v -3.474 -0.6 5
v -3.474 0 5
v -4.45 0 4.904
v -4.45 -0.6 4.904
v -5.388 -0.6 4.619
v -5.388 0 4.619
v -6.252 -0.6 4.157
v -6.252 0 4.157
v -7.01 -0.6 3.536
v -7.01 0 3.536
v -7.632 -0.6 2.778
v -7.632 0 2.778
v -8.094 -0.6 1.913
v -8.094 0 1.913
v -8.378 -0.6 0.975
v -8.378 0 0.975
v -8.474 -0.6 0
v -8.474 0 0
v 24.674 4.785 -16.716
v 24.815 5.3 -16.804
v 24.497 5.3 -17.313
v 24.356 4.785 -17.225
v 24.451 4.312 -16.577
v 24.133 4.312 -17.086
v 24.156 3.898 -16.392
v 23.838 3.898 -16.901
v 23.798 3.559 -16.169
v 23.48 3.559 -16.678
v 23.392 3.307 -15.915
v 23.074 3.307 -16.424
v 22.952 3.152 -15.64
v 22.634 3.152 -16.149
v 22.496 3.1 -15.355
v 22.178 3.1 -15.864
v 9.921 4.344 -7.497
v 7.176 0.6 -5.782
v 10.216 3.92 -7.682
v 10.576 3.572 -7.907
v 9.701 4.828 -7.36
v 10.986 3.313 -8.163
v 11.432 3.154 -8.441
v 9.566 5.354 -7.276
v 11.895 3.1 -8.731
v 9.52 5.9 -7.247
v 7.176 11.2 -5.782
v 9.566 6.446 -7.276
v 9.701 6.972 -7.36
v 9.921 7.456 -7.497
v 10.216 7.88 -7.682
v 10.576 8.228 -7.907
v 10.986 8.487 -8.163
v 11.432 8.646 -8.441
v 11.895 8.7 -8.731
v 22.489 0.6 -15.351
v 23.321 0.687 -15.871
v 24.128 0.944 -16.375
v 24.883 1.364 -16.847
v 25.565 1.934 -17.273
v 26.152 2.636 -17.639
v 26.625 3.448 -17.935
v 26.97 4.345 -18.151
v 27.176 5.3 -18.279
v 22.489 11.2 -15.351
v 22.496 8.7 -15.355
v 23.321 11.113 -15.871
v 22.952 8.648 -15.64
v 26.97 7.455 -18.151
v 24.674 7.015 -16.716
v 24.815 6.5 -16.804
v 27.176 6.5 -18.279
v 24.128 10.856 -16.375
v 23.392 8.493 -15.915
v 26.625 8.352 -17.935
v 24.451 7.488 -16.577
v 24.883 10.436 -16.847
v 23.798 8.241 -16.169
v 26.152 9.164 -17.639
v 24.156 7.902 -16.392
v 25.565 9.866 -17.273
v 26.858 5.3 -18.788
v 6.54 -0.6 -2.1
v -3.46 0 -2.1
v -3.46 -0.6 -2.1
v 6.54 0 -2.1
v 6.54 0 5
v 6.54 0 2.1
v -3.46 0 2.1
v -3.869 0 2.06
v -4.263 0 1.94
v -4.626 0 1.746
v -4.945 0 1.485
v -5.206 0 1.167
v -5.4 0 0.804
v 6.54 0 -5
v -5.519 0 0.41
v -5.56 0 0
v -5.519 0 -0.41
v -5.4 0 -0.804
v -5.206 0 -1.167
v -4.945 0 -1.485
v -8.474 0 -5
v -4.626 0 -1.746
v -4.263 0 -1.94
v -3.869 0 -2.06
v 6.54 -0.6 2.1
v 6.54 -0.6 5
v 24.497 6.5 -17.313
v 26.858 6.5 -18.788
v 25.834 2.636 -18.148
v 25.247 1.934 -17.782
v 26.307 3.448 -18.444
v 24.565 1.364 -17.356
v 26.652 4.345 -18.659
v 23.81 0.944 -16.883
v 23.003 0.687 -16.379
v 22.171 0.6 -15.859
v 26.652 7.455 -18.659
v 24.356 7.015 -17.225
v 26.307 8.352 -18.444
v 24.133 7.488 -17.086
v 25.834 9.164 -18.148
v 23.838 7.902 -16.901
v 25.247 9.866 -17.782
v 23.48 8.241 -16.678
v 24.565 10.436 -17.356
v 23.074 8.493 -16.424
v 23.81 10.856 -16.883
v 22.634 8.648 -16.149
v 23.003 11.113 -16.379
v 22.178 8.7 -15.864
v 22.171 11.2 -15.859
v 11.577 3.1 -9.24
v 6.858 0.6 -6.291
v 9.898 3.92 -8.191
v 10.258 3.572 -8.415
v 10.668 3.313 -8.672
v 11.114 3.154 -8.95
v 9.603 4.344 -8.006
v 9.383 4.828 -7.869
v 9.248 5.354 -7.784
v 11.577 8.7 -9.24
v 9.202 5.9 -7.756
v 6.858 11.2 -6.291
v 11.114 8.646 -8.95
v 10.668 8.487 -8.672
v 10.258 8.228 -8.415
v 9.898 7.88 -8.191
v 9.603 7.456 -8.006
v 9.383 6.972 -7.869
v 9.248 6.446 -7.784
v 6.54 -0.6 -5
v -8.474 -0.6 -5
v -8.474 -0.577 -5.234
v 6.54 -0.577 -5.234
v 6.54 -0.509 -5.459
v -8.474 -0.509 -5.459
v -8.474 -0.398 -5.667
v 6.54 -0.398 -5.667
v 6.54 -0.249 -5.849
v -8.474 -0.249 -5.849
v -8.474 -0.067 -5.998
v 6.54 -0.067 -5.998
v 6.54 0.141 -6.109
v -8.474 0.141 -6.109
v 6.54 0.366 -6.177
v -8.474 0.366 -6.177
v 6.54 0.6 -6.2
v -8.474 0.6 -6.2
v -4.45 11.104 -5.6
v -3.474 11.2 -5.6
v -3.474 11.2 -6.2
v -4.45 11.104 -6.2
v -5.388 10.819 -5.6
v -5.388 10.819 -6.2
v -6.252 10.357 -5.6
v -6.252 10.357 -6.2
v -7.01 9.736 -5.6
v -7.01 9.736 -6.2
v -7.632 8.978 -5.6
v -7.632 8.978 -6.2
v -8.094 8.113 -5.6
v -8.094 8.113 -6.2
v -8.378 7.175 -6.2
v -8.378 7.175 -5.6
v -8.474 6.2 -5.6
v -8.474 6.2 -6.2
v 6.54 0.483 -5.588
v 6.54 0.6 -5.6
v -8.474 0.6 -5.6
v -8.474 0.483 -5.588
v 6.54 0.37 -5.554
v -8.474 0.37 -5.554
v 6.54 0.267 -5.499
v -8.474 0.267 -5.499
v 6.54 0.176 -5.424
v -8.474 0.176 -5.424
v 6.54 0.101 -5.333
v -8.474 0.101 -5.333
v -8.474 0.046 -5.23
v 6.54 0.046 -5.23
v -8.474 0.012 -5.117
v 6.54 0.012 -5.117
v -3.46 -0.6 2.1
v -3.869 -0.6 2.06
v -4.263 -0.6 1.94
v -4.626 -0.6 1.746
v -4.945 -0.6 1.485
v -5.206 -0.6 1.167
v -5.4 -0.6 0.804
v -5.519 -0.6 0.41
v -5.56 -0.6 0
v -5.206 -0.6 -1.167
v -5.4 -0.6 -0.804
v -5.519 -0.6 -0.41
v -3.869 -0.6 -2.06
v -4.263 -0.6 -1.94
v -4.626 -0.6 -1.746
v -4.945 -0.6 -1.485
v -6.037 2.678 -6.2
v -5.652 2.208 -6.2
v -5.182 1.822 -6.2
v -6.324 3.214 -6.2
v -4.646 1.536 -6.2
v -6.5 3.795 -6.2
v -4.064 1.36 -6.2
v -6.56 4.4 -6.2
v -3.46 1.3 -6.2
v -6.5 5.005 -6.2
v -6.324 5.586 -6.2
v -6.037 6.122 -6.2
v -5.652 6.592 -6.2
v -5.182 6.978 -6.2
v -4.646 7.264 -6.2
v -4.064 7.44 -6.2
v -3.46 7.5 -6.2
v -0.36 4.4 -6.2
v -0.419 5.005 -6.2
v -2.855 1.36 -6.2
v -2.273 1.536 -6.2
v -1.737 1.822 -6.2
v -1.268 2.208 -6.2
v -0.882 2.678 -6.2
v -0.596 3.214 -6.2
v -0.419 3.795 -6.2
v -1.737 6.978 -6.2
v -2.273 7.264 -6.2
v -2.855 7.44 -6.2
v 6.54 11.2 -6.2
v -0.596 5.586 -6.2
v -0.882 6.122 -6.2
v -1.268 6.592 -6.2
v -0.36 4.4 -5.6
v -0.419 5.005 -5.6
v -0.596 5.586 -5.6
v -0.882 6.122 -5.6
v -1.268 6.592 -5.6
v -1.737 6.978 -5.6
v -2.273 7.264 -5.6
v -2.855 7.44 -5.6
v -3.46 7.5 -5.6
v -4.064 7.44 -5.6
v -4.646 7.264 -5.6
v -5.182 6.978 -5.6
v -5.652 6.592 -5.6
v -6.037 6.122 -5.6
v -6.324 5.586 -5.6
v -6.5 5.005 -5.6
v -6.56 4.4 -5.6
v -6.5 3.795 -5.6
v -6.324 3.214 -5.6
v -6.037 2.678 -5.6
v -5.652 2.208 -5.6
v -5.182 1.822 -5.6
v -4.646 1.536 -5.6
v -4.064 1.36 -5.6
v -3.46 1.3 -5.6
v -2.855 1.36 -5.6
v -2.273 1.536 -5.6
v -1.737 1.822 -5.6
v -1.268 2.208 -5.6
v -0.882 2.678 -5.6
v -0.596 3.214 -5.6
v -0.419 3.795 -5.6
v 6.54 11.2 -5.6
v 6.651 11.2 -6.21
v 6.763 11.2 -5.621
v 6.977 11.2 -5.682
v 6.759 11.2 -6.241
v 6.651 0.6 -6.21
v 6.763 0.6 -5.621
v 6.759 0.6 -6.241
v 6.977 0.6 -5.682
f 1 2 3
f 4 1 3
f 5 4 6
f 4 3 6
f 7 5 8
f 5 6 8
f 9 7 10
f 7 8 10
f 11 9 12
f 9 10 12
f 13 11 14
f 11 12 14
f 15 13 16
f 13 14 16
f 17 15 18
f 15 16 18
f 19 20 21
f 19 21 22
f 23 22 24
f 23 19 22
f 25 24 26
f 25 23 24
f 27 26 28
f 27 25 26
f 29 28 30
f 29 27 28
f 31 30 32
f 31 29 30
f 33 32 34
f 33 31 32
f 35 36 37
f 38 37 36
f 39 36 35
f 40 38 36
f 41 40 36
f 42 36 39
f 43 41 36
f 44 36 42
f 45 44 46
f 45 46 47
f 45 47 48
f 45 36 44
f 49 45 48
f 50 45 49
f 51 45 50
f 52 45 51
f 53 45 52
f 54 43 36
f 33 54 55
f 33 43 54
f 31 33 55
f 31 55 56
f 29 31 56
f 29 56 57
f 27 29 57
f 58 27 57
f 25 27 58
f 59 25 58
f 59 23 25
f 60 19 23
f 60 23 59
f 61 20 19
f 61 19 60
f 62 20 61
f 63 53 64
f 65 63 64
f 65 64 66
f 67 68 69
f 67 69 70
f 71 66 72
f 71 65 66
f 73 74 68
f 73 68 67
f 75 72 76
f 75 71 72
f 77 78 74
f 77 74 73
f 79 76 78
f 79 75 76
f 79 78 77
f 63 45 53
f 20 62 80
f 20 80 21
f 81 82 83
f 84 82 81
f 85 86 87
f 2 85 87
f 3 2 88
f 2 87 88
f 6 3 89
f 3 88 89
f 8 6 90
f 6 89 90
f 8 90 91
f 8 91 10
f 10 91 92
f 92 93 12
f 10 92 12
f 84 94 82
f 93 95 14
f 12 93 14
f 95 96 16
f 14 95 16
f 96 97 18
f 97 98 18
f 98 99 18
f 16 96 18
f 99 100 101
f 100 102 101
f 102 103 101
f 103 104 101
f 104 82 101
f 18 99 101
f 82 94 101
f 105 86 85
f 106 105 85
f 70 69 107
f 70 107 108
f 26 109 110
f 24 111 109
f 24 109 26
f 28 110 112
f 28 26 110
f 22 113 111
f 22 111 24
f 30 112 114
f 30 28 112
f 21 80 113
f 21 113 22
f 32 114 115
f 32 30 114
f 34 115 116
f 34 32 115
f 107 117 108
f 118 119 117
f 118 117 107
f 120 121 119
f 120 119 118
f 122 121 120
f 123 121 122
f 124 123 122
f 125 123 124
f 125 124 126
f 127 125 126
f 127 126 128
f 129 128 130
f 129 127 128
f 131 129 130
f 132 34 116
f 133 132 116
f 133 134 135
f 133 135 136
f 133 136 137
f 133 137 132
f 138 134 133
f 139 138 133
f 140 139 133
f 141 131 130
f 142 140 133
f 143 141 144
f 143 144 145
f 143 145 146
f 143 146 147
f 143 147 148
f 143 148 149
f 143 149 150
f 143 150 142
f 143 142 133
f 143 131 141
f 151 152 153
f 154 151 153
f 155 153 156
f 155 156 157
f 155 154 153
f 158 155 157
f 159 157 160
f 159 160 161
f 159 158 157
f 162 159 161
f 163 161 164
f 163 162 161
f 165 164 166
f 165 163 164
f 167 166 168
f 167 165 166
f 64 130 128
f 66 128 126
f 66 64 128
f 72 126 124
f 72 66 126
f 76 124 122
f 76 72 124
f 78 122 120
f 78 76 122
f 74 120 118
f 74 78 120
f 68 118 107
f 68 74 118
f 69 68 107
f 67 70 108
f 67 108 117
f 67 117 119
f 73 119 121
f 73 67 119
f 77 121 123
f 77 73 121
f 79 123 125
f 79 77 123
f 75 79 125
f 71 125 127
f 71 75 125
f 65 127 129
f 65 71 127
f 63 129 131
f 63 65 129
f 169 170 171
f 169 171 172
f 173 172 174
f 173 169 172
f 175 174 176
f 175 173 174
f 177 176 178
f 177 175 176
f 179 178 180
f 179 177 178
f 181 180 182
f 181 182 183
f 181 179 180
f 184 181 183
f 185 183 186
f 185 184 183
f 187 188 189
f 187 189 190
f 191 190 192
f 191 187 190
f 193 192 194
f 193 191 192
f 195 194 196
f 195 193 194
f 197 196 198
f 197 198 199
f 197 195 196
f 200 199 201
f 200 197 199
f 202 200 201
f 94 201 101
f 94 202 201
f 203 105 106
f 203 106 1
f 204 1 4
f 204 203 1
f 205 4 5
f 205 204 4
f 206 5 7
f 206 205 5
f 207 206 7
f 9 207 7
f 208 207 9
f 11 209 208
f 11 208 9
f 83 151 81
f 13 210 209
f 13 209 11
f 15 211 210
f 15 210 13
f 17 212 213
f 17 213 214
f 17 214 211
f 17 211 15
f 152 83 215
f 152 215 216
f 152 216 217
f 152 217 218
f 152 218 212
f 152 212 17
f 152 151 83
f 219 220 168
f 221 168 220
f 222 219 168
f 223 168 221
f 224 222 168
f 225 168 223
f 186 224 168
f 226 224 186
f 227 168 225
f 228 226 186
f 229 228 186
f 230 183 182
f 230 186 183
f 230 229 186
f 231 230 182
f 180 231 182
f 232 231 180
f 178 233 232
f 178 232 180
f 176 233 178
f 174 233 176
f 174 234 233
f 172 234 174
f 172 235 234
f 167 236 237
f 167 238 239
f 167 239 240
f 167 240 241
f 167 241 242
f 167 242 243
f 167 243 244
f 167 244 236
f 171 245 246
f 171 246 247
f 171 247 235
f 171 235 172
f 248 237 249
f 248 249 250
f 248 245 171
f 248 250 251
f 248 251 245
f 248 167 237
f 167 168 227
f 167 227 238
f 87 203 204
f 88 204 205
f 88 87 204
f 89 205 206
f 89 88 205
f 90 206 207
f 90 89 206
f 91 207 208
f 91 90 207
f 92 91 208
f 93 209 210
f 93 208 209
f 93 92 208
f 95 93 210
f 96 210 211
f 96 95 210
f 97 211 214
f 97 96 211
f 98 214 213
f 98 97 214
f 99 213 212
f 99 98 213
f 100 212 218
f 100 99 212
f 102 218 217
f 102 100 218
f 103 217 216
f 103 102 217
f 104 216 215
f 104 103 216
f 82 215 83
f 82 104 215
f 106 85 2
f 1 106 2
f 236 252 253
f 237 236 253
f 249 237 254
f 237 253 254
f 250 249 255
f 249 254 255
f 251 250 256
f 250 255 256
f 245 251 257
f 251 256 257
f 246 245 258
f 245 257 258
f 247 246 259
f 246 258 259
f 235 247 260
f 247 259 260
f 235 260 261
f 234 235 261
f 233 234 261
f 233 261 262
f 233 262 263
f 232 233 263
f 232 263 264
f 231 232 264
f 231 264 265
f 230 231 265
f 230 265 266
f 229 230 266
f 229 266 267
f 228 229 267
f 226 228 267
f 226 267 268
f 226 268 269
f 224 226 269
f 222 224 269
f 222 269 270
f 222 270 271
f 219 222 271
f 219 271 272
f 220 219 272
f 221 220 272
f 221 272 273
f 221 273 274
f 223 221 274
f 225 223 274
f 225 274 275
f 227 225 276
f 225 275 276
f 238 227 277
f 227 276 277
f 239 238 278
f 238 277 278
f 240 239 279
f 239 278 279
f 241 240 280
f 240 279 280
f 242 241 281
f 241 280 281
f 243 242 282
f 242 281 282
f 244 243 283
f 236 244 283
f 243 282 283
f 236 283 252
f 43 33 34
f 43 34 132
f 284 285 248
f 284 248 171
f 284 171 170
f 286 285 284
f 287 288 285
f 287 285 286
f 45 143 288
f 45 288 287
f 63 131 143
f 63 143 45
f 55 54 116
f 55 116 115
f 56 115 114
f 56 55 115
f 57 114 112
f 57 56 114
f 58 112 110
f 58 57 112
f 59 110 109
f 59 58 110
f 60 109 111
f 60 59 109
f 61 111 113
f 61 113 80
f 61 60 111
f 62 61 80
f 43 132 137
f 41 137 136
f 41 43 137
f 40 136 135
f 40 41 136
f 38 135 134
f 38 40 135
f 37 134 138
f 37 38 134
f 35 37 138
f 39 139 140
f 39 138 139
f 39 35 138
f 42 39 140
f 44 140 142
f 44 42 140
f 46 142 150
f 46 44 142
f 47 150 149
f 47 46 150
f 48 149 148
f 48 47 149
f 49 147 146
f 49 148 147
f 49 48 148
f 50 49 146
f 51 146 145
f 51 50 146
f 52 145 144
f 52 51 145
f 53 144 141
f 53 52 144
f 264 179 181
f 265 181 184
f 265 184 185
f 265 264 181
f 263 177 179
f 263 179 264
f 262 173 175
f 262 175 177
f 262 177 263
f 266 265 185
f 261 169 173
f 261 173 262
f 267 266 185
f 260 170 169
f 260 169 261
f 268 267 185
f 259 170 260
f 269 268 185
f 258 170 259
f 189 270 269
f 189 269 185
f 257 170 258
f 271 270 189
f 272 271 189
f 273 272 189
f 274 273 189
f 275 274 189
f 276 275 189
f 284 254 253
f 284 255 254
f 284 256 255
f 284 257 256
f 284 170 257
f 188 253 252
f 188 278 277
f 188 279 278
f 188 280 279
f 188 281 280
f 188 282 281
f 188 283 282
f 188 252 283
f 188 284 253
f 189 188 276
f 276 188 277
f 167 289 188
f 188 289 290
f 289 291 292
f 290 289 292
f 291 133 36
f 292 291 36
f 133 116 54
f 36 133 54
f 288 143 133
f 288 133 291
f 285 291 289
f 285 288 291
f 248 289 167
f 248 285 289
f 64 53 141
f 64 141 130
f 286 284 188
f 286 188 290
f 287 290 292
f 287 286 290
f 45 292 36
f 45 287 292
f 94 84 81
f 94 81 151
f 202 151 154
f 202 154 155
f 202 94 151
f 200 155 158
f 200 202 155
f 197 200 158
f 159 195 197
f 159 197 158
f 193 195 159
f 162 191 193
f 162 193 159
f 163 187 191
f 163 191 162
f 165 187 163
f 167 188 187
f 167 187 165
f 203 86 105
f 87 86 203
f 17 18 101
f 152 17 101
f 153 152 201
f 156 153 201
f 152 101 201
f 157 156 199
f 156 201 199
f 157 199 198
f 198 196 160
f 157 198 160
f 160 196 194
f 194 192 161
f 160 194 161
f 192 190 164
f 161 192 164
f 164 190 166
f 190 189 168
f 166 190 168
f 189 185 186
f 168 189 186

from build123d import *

# Parameters (mm, degrees)
BASE_FLANGE1_DEPTH = 0.6
CUT_EXTRUDE1_DEPTH = 10
EDGE_FLANGE1_DEPTH = 15.014611851
CUT_EXTRUDE2_DEPTH = 10
SKETCH11_R         = 3.1
CUT_EXTRUDE3_DEPTH = 10
EDGE_FLANGE2_DEPTH = 10.6
CUT_EXTRUDE4_DEPTH = 10
CUT_EXTRUDE5_DEPTH = 10


# Sheet-metal steps are written as plain solids
with BuildPart() as part:
    # Sketch1 → Base-Flange1 (new body)
    with BuildSketch(Plane(origin=(0, 0, 0), x_dir=(1, 0, 0), z_dir=(0, 1, 0))):
        with BuildLine():
            Line((-8.474188988, 5), (6.540422863, 5))
            Line((6.540422863, 5), (6.540422863, -5))
            Line((6.540422863, -5), (-3.474188988, -5))
            ThreePointArc((-3.474188988, -5), (-7.009722894, -3.535533906), (-8.474188988, 0))
            Line((-8.474188988, 0), (-8.474188988, 5))
        make_face()
    extrude(amount=-BASE_FLANGE1_DEPTH)

    # Sketch6 → Cut-Extrude1 (cut)
    with BuildSketch(Plane(origin=(0, 0, 0), x_dir=(1, 0, 0), z_dir=(0, 1, 0))):
        with BuildLine():
            Line((6.540422863, -2.1), (-3.459577137, -2.1))
            ThreePointArc((-3.459577137, -2.1), (-5.559577137, 0), (-3.459577137, 2.1))
            Line((-3.459577137, 2.1), (6.540422863, 2.1))
            Line((6.540422863, 2.1), (6.540422863, -2.1))
        make_face()
    extrude(amount=-CUT_EXTRUDE1_DEPTH, mode=Mode.SUBTRACT)

    # Edge-Flange1 section (across the edge) → Edge-Flange1 (add)
    with BuildSketch(Plane(origin=(6.540422863, 0, -5.6), x_dir=(0, 0, 1), z_dir=(-1, 0, 0))):
        with BuildLine():
            Line((-0.6, 0.6), (-0.6, 11.2))
            Line((-0.6, 11.2), (0, 11.2))
            Line((0, 11.2), (0, 0.6))
            ThreePointArc((0, 0.6), (0.175735931, 0.175735931), (0.6, 0))
            Line((0.6, 0), (0.6, -0.6))
            ThreePointArc((0.6, -0.6), (-0.248528137, -0.248528137), (-0.6, 0.6))
        make_face()
    extrude(amount=EDGE_FLANGE1_DEPTH)

    # Sketch10 → Cut-Extrude2 (cut)
    with BuildSketch(Plane.XY.offset(-5.6)):
        with BuildLine():
            Line((-8.474188988, 6.2), (-8.474188988, 11.2))
            Line((-8.474188988, 11.2), (-3.474188988, 11.2))
            ThreePointArc((-3.474188988, 11.2), (-7.009722894, 9.735533906), (-8.474188988, 6.2))
        make_face()
    extrude(amount=-CUT_EXTRUDE2_DEPTH, mode=Mode.SUBTRACT)

    # Sketch11 → Cut-Extrude3 (cut)
    with BuildSketch(Plane.XY.offset(-5.6)):
        with Locations((-3.459577137, 4.4)):
            Circle(SKETCH11_R)
    extrude(amount=-CUT_EXTRUDE3_DEPTH, mode=Mode.SUBTRACT)

    # Edge-Flange2 section (across the edge) → Edge-Flange2 (add)
    with BuildSketch(Plane(origin=(6.712470095, 11.2, -6.2), x_dir=(-0.5299192642332, 0, -0.8480480961564292), z_dir=(0, -1, 0))):
        with BuildLine():
            Line((-0.6, 0.172047231), (-0.6, 23.827952769))
            Line((-0.6, 23.827952769), (0, 23.827952769))
            Line((0, 23.827952769), (0, 0.172047231))
            ThreePointArc((0, 0.172047231), (0.023242982, 0.006664818), (0.091171142, -0.145904327))
            Line((0.091171142, -0.145904327), (-0.417657715, -0.463855886))
            ThreePointArc((-0.417657715, -0.463855886), (-0.553514035, -0.158717596), (-0.6, 0.172047231))
        make_face()
    extrude(amount=EDGE_FLANGE2_DEPTH)

    # Sketch17 → Cut-Extrude4 (cut)
    with BuildSketch(Plane(origin=(-0.583351544, 0, -0.933557619), x_dir=(0.848048096156429, 0, -0.5299192642332), z_dir=(0.5299192642332001, 0, 0.8480480961564291))):
        with BuildLine():
            Line((14.714141037, 8.7), (27.214141037, 8.7))
            ThreePointArc((27.214141037, 8.7), (30.014141037, 5.9), (27.214141037, 3.1))
            Line((27.214141037, 3.1), (14.714141037, 3.1))
            ThreePointArc((14.714141037, 3.1), (11.914141037, 5.9), (14.714141037, 8.7))
        make_face()
        with BuildLine():
            Line((32.805949691, 11.2), (32.805949691, 0.6))
            Line((32.805949691, 0.6), (27.205949691, 0.6))
            ThreePointArc((27.205949691, 0.6), (31.058221748, 2.135519713), (32.797908203, 5.9))
            ThreePointArc((32.797908203, 5.9), (31.058221748, 9.664480287), (27.205949691, 11.2))
            Line((27.205949691, 11.2), (32.805949691, 11.2))
        make_face()
    extrude(amount=-CUT_EXTRUDE4_DEPTH, mode=Mode.SUBTRACT)

    # Sketch19 → Cut-Extrude5 (cut)
    with BuildSketch(Plane(origin=(-0.583351544, 0, -0.933557619), x_dir=(0.8480480961564292, 0, -0.5299192642331998), z_dir=(0.5299192642331998, 0, 0.8480480961564292))):
        with BuildLine():
            Line((32.733155133, 5.3), (29.949099903, 5.3))
            ThreePointArc((29.949099903, 5.3), (30.014141037, 5.9), (29.949099903, 6.5))
            Line((29.949099903, 6.5), (32.733155133, 6.5))
            ThreePointArc((32.733155133, 6.5), (32.809148381, 5.9), (32.733155133, 5.3))
        make_face()
    extrude(amount=-CUT_EXTRUDE5_DEPTH, mode=Mode.SUBTRACT)


solid = part.part
